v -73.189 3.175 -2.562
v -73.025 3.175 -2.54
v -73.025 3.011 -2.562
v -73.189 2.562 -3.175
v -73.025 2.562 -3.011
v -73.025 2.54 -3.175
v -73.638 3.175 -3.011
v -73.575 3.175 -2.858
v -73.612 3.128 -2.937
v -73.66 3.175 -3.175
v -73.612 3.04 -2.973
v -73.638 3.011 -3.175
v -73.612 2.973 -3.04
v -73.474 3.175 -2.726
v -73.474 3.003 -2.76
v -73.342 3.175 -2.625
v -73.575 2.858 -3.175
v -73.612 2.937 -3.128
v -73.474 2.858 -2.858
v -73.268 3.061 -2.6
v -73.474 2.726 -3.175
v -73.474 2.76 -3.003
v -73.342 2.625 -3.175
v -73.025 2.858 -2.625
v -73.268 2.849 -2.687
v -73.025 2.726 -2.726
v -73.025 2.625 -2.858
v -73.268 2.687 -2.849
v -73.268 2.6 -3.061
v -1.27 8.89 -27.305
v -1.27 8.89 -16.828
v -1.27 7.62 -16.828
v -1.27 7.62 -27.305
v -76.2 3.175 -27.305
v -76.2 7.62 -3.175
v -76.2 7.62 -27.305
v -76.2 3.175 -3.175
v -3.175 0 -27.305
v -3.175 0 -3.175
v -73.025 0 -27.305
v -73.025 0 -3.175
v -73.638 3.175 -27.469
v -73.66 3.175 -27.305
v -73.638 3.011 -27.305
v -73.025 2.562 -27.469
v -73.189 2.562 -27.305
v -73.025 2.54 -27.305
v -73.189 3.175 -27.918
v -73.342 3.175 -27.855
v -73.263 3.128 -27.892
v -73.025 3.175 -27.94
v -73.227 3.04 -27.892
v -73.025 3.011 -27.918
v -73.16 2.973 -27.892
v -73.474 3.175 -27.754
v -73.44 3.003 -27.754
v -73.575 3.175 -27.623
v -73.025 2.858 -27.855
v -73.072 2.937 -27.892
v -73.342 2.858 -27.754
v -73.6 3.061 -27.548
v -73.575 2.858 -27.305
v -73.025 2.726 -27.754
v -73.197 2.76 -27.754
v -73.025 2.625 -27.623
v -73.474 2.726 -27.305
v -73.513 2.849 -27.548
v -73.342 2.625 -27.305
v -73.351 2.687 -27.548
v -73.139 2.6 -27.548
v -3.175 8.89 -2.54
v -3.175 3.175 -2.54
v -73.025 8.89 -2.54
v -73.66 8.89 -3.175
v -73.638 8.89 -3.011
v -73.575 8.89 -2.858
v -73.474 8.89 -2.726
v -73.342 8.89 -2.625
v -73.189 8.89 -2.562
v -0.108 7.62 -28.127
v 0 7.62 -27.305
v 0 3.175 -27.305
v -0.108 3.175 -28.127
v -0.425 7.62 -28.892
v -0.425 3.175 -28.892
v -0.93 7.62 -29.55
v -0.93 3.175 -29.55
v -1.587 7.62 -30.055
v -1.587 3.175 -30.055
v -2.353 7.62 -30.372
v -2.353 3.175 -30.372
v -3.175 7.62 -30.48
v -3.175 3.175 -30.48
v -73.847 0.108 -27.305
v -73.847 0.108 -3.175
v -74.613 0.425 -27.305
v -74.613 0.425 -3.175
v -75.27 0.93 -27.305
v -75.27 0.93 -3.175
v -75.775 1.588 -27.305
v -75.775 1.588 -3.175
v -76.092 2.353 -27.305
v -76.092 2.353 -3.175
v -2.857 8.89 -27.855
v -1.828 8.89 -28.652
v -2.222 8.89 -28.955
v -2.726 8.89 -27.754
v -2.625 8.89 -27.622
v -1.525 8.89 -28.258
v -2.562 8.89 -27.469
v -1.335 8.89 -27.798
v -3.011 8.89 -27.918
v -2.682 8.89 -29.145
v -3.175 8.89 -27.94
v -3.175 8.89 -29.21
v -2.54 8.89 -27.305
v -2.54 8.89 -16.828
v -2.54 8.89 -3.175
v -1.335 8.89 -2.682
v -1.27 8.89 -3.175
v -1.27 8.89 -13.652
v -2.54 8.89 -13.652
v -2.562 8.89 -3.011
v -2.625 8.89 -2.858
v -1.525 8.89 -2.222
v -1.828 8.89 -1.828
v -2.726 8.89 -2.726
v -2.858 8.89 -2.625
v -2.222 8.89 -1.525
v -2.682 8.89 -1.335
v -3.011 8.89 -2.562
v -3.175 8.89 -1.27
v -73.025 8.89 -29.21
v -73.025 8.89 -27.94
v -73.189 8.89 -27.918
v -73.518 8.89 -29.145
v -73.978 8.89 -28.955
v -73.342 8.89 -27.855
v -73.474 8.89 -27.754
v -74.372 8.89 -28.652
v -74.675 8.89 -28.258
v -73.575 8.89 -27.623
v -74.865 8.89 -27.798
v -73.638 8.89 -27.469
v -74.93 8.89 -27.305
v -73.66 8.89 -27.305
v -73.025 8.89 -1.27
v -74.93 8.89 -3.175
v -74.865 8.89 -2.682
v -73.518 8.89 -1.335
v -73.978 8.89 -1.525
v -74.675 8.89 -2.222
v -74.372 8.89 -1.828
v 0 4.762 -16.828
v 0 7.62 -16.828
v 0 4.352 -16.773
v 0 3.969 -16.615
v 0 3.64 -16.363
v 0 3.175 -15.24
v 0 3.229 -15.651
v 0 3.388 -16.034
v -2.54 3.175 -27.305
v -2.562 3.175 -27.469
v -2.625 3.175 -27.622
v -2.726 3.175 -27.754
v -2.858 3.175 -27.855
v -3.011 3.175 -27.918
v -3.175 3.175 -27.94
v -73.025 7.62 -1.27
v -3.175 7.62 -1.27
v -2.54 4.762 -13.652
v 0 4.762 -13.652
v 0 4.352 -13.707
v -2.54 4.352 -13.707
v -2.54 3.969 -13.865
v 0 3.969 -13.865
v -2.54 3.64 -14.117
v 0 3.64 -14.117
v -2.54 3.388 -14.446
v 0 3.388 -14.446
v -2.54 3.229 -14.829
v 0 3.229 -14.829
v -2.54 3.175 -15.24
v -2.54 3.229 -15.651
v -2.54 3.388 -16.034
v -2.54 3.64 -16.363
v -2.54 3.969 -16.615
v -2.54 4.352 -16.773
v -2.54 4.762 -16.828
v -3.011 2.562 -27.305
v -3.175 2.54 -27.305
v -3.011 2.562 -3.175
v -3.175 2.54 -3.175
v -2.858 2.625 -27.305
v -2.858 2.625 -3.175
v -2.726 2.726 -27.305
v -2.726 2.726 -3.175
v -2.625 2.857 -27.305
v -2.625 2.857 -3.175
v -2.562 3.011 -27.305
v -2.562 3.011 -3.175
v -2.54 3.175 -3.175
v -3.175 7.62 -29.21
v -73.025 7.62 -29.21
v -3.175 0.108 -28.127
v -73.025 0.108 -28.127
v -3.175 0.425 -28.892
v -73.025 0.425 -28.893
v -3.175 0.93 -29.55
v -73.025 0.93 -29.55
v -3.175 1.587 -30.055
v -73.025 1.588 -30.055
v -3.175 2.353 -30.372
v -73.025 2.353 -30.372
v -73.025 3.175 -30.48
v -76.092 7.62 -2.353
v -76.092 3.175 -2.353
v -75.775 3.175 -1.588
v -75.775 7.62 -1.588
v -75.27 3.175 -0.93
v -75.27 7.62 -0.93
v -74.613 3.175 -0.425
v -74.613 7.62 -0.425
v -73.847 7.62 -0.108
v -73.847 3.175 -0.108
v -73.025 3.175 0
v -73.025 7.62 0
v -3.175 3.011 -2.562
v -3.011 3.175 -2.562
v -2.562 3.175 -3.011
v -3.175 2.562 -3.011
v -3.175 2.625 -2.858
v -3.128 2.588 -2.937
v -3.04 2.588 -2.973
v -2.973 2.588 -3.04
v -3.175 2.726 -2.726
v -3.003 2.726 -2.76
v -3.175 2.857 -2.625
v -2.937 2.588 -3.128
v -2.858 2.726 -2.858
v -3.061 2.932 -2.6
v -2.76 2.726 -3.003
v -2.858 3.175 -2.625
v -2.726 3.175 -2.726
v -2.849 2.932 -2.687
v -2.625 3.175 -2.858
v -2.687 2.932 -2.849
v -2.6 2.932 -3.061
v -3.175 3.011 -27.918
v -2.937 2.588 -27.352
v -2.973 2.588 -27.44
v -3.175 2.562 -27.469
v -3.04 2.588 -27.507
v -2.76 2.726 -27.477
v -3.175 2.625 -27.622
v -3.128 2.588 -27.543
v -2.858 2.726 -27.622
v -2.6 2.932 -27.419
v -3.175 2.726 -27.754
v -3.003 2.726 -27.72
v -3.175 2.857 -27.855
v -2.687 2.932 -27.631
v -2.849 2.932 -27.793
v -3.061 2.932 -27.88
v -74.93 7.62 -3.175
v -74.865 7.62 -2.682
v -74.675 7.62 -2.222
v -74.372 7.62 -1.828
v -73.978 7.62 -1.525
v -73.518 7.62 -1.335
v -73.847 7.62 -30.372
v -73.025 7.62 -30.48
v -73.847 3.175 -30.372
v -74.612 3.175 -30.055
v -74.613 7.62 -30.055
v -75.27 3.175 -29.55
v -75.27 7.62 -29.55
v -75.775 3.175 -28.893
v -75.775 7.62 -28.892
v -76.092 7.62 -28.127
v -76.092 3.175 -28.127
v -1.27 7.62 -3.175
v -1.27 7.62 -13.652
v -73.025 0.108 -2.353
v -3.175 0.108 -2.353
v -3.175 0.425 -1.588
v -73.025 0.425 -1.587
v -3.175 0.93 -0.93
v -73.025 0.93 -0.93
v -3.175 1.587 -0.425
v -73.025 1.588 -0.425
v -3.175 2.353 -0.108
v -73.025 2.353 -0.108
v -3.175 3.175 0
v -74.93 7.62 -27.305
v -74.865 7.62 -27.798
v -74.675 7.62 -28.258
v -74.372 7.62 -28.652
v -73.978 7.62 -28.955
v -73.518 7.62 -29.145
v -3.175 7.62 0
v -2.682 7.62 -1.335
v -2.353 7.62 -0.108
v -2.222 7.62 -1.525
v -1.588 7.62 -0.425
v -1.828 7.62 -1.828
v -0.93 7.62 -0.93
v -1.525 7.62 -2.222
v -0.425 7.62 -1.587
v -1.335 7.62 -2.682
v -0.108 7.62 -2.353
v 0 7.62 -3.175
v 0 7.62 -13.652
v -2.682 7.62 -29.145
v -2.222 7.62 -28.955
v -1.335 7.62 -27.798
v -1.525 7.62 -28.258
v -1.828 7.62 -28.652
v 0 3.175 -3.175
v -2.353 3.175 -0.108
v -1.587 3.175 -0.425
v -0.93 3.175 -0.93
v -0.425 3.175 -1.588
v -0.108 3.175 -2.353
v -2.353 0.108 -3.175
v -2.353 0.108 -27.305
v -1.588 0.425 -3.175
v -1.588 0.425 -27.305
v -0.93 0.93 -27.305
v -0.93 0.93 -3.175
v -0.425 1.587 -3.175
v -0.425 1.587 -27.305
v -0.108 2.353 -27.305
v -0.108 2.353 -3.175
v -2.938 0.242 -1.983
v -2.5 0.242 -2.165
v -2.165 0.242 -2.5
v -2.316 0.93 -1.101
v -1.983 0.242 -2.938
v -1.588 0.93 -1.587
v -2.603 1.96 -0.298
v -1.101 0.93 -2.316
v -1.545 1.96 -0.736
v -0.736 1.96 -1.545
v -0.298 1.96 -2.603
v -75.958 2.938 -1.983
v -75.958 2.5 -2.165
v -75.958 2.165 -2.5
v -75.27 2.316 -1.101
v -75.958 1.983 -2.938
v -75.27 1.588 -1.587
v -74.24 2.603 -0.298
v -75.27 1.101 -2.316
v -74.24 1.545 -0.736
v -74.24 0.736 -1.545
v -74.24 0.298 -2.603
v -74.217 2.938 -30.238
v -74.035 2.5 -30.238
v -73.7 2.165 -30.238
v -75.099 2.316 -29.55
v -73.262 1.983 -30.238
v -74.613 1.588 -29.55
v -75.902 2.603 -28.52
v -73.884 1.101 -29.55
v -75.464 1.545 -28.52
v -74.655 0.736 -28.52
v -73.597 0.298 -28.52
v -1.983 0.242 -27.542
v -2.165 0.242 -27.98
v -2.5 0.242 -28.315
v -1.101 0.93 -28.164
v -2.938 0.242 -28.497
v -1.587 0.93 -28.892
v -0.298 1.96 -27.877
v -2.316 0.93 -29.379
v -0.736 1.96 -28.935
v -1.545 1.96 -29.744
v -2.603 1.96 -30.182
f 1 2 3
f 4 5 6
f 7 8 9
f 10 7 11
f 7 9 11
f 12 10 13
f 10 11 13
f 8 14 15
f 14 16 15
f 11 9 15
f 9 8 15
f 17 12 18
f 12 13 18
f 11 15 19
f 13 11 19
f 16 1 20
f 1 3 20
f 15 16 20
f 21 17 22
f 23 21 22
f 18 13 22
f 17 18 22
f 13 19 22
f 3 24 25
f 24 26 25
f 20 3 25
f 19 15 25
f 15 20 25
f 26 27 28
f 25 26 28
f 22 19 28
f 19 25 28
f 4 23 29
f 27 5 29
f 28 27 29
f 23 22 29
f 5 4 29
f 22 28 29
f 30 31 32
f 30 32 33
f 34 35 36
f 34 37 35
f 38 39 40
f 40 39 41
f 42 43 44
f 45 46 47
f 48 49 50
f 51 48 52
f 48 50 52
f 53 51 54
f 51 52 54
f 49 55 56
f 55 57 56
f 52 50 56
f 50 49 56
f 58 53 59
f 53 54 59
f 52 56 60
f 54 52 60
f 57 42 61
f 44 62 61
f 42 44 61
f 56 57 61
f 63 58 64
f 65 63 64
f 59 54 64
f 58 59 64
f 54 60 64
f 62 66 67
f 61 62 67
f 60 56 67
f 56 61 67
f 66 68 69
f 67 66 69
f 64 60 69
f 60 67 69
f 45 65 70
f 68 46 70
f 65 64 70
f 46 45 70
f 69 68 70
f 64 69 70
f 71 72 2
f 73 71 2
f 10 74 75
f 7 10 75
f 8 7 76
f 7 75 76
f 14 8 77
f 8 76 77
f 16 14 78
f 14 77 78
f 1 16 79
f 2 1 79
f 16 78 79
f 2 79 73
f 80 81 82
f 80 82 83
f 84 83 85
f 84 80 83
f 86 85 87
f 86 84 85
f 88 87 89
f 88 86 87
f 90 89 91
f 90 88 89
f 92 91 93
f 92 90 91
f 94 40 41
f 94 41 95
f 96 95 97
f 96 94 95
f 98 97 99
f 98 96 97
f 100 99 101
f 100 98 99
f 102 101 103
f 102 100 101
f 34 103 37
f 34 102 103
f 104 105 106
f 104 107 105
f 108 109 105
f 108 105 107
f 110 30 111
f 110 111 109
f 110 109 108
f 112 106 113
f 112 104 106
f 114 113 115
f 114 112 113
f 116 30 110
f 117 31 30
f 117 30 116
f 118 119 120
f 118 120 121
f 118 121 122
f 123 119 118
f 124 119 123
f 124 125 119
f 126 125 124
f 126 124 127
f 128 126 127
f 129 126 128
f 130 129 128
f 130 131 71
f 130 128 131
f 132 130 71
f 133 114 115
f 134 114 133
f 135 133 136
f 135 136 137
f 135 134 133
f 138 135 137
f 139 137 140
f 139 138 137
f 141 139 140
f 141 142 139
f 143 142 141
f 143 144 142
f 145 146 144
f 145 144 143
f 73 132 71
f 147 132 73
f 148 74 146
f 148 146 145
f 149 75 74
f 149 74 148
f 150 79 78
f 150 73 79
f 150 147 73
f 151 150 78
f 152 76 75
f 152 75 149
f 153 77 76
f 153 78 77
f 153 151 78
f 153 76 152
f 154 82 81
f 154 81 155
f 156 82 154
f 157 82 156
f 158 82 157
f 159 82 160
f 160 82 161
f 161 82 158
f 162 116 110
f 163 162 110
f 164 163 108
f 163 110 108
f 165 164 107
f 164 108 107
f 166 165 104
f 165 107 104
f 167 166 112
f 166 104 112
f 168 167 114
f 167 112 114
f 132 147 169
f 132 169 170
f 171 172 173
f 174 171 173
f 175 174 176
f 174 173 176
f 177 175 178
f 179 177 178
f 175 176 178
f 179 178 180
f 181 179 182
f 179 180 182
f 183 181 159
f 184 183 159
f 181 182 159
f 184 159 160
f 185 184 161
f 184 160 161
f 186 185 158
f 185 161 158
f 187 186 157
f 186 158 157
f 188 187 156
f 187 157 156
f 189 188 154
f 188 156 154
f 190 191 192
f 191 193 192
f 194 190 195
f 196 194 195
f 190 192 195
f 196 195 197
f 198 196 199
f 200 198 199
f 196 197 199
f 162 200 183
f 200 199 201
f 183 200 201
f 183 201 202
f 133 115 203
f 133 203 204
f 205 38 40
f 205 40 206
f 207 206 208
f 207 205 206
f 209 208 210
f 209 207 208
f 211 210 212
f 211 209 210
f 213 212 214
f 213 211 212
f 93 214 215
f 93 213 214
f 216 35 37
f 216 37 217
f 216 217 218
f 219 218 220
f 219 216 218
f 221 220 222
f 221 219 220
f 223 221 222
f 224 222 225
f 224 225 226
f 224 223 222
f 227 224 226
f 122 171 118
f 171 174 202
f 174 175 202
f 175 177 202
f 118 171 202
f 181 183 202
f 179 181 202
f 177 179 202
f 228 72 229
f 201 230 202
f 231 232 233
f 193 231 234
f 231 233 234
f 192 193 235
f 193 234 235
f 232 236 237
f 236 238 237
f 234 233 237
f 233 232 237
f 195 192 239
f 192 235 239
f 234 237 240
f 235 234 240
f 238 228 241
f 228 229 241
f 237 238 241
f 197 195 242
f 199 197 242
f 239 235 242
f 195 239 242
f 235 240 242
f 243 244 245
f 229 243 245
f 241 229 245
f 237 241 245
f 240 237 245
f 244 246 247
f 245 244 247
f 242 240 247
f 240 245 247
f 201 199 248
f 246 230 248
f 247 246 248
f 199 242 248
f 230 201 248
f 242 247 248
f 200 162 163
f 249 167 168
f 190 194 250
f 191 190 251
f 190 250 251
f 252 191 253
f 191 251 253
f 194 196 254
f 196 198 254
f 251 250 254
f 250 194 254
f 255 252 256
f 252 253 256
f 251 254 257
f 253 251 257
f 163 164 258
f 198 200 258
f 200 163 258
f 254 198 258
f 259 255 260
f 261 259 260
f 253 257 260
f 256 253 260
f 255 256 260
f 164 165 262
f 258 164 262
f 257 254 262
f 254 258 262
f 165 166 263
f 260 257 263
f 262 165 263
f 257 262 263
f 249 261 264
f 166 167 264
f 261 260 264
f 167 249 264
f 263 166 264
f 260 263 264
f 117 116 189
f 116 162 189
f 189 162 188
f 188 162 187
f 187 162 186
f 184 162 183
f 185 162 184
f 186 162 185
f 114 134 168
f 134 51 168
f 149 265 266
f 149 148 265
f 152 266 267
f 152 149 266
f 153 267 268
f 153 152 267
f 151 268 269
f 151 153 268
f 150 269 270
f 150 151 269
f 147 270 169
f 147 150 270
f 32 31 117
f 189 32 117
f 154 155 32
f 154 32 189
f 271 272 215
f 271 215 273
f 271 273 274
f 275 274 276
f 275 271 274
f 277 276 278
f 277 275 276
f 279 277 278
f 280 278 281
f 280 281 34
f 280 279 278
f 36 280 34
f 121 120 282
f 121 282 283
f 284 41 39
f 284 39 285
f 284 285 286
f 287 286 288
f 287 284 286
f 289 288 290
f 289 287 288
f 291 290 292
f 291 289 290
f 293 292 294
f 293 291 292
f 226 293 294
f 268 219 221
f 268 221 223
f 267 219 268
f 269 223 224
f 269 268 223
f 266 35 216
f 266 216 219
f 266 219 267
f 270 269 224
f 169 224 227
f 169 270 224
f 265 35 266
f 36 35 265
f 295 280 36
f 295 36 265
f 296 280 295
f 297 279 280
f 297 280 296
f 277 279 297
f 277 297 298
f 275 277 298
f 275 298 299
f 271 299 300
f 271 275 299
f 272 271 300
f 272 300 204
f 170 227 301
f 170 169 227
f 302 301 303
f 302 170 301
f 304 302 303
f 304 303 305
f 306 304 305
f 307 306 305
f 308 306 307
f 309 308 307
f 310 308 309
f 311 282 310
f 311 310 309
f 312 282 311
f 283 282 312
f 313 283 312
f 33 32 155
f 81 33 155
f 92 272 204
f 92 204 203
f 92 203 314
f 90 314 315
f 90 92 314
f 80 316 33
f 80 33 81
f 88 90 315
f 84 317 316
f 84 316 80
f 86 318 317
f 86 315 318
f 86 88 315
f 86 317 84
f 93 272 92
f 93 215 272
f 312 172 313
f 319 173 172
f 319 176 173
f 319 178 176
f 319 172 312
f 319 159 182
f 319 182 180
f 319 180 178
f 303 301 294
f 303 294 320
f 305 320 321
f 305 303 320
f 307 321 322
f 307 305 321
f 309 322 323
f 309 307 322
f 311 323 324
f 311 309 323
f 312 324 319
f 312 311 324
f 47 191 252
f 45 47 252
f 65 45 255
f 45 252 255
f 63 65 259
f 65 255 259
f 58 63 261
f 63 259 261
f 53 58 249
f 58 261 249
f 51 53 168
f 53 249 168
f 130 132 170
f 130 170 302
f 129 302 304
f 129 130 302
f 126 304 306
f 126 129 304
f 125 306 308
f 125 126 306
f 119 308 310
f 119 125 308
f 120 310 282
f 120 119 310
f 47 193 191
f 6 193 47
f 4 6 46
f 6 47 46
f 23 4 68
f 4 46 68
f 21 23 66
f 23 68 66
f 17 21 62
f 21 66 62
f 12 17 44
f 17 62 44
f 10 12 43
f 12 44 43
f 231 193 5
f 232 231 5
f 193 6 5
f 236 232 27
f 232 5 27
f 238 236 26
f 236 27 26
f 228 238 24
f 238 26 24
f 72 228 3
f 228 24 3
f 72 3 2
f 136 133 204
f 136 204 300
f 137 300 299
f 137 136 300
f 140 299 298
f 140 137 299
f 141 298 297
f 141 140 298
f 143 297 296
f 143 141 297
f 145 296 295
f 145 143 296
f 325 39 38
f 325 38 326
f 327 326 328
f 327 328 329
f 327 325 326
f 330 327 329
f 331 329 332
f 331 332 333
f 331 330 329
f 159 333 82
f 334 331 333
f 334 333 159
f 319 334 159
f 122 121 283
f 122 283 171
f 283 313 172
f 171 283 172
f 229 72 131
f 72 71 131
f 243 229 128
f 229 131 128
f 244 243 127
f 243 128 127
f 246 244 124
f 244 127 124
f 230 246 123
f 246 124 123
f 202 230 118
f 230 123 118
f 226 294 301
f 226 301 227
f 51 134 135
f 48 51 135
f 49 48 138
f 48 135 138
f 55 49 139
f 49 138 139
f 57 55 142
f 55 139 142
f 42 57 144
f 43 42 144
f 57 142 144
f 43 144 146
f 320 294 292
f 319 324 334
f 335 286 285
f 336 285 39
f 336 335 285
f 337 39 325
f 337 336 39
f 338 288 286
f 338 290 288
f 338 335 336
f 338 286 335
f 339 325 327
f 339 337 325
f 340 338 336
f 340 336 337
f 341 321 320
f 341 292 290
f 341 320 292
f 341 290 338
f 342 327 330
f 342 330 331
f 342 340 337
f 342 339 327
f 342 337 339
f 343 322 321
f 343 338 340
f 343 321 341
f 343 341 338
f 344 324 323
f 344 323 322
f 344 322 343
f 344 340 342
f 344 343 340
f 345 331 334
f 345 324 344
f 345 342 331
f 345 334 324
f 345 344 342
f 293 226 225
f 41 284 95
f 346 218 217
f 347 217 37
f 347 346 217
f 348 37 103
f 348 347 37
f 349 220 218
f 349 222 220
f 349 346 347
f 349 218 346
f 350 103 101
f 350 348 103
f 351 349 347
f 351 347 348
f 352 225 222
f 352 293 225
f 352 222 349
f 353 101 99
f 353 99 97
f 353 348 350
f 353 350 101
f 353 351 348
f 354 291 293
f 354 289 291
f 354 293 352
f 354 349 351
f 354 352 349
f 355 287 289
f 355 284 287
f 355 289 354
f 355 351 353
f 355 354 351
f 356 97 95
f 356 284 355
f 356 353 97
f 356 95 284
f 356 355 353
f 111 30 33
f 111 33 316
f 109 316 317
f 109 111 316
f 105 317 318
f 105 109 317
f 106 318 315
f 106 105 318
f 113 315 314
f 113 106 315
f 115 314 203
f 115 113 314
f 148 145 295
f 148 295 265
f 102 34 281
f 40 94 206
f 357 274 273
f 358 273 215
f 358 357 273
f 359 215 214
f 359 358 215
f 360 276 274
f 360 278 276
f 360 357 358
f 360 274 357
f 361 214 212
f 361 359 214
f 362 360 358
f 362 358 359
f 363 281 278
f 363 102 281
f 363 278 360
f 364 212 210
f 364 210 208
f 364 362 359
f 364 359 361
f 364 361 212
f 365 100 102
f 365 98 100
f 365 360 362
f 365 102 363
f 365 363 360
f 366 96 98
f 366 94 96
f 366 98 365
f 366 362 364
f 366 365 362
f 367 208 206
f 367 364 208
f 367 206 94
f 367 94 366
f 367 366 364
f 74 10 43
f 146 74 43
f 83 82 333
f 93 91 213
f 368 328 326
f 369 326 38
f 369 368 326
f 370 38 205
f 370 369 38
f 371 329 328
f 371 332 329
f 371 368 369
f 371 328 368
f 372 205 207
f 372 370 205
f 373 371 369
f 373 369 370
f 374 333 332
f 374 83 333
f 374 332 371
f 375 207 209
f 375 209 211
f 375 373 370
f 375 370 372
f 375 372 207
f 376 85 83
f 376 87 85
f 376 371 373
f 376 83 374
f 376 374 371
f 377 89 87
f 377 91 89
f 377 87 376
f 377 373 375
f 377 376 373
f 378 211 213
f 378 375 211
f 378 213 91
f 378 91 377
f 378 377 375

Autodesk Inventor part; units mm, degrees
ref_plane "YZ Plane" through (0, 0, 0) normal (1, 0, 0) x (0, 1, 0)
ref_plane "XZ Plane" through (0, 0, 0) normal (0, 1, 0) x (-1, 0, 0)
ref_plane "XY Plane" through (0, 0, 0) normal (0, 0, 1) x (1, 0, 0)
sketch "Sketch1" plane through (0, 0, 0) normal (0, 1, 0) x (-1, 0, 0)
  line L0 (0, 0) -> (76.2, 0)
  line L1 (76.2, 0) -> (76.2, -30.48)
  line L2 (76.2, -30.48) -> (0, -30.48)
  line L3 (0, -30.48) -> (0, 0)
  dimension "d0" = 76.2
  dimension "d1" = 30.48
extrude "Extrusion1" add sketch "Sketch1" along normal blind 8.89
fillet "Fillet1" radius 3.175 8 edges at (0, 4.445, 0) (0, 4.445, -30.48) (0, 0, -15.24) (-38.1, 0, 0) (-76.2, 4.445, 0) (-76.2, 0, -15.24) (-76.2, 4.445, -30.48) (-38.1, 0, -30.48)
shell "Shell1" thickness 2.54 removed faces 1 at (-26.4583, 8.89, -20.32)
sketch "Sketch2" plane through (0, 8.89, 0) normal (0, 1, 0) x (1, 0, 0)
  arc A0 (-76.2, 3.175) -> (-73.025, 0) centre (-73.025, 3.175) ccw projected
  line L0 (-76.2, 27.305) -> (-76.2, 3.175) projected
  arc A1 (-73.025, 30.48) -> (-76.2, 27.305) centre (-73.025, 27.305) ccw projected
  line L1 (-3.175, 30.48) -> (-73.025, 30.48) projected
  line L2 (-73.025, 0) -> (-3.175, 0) projected
  arc A2 (-3.175, 0) -> (0, 3.175) centre (-3.175, 3.175) ccw projected
  line L3 (0, 3.175) -> (0, 27.305) projected
  arc A3 (0, 27.305) -> (-3.175, 30.48) centre (-3.175, 27.305) ccw projected
  arc A4 (-73.025, 29.21) -> (-74.93, 27.305) centre (-73.025, 27.305) ccw
  line L4 (-74.93, 27.305) -> (-74.93, 3.175)
  arc A5 (-74.93, 3.175) -> (-73.025, 1.27) centre (-73.025, 3.175) ccw
  line L5 (-73.025, 1.27) -> (-3.175, 1.27)
  arc A6 (-3.175, 1.27) -> (-1.27, 3.175) centre (-3.175, 3.175) ccw
  line L6 (-1.27, 3.175) -> (-1.27, 27.305)
  arc A7 (-1.27, 27.305) -> (-3.175, 29.21) centre (-3.175, 27.305) ccw
  line L7 (-3.175, 29.21) -> (-73.025, 29.21)
  point P0 (0, 0)
  dimension "d6" = 1.27
extrude "Extrusion2" cut sketch "Sketch2" against normal blind 1.27
sketch "Sketch3" plane through (0, 3.175, -3.175) normal (1, 0, 0) x (0, 0, -1)
  line L0 (0, 5.715) -> (24.13, 5.715) projected
  line L1 (12.065, 5.715) -> (12.065, 0.3712)
  line L2 (13.6525, 5.715) -> (13.6525, 1.5875)
  line L3 (10.4775, 5.715) -> (10.4775, 1.5875)
  line L4 (12.065, 0) -> (12.065, 0)
  arc A0 (10.4775, 1.5875) -> (12.065, 0) centre (12.065, 1.5875) ccw
  arc A1 (12.065, 0) -> (13.6525, 1.5875) centre (12.065, 1.5875) ccw
  line L5 (10.4775, 5.715) -> (13.6525, 5.715)
  point P0 (-3.175, -3.175)
  dimension "d9" = 1.5875
  dimension "d10" = 1.5875
  dimension "d11" = 5.715
  dimension "d12" = 1.5875
extrude "Extrusion3" cut sketch "Sketch3" against normal blind 2.54
properties part number "box_bottom"
